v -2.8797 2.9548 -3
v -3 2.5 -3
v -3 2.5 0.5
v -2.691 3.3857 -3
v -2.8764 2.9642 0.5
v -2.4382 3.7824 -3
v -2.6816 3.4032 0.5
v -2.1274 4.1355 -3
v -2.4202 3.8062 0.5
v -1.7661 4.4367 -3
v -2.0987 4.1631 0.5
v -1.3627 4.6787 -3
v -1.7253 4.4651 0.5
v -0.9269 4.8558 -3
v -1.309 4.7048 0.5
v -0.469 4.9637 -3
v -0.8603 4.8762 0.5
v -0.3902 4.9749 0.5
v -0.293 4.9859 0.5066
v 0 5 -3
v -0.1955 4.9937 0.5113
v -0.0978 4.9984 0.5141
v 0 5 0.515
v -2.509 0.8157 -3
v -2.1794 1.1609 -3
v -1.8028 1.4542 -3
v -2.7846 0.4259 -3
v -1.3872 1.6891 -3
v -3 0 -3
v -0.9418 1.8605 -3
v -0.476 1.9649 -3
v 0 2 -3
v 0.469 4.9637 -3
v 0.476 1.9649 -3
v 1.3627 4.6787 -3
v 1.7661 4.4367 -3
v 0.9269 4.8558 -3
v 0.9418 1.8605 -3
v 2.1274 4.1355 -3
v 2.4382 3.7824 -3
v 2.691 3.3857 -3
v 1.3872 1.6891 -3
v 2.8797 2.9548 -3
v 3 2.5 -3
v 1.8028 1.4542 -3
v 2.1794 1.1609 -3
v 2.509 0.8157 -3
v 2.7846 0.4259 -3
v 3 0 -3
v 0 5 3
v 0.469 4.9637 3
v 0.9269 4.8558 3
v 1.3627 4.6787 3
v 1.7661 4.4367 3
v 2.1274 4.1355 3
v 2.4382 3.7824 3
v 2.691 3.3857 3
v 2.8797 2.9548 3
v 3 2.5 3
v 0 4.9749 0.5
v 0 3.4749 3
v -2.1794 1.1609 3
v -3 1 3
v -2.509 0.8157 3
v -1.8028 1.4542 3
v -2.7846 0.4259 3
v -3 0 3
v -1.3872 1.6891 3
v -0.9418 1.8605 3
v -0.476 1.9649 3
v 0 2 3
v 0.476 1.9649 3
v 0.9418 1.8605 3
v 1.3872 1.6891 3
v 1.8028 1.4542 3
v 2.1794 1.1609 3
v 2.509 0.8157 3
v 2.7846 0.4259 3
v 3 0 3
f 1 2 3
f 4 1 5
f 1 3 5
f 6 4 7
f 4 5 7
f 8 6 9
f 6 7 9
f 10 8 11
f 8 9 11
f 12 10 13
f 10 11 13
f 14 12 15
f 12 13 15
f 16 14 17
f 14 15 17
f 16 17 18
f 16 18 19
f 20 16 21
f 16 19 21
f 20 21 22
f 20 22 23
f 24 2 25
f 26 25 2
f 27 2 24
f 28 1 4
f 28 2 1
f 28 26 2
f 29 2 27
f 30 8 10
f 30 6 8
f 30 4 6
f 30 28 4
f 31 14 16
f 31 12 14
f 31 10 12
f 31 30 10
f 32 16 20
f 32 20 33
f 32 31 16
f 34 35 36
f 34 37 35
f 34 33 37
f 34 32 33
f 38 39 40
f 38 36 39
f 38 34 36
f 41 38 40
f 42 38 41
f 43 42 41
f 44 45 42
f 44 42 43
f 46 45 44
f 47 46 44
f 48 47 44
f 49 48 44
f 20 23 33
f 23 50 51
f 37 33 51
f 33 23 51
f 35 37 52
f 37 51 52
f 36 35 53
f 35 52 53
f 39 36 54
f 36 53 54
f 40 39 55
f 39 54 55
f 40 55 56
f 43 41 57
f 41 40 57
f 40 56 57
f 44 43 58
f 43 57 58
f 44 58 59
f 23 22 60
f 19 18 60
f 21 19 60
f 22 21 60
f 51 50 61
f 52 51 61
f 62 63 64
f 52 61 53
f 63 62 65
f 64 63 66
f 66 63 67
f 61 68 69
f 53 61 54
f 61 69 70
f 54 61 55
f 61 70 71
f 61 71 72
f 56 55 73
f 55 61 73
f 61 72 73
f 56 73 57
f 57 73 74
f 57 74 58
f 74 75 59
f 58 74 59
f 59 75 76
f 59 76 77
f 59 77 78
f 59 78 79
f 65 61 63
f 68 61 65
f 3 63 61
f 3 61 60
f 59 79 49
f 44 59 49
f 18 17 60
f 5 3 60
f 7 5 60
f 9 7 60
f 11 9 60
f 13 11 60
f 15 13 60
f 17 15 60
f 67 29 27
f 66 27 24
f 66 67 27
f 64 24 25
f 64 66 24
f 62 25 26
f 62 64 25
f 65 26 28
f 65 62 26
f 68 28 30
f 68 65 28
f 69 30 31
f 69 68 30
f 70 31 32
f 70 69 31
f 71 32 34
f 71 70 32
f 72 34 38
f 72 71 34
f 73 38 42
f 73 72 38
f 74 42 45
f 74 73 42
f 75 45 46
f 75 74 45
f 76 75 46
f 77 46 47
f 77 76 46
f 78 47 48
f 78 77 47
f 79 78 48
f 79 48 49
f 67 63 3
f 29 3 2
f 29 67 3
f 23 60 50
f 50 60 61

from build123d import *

# Parameters (mm, degrees)
SKETCH1_W           = 6
SKETCH1_H           = 6
BOSS_EXTRUDE1_DEPTH = 5
CUT_EXTRUDE4_DEPTH  = 12.5
CUT_EXTRUDE5_DEPTH  = 10
CUT_EXTRUDE6_DEPTH  = 10


with BuildPart() as part:
    # Sketch1 → Boss-Extrude1 (new body)
    with BuildSketch(Plane(origin=(0, 0, 0), x_dir=(1, 0, 0), z_dir=(0, 1, 0))):
        Rectangle(SKETCH1_W, SKETCH1_H)
    extrude(amount=BOSS_EXTRUDE1_DEPTH)

    # Sketch5 → Cut-Extrude4 (cut)
    with BuildSketch(Plane.XY.offset(3)):
        with BuildLine():
            Line((-3, 5), (-3, 2.5))
            ThreePointArc((-3, 2.5), (-1.952562419, 4.293074903), (0, 5))
            Line((0, 5), (-3, 5))
        make_face()
        with BuildLine():
            ThreePointArc((0, 5), (1.952562419, 4.293074903), (3, 2.5))
            Line((3, 2.5), (3, 5))
            Line((3, 5), (0, 5))
        make_face()
        with BuildLine():
            ThreePointArc((-3, 0), (0, 2), (3, 0))
            Line((3, 0), (-3, 0))
        make_face()
    extrude(amount=-CUT_EXTRUDE4_DEPTH, mode=Mode.SUBTRACT)

    # 3DSketch1 → Cut-Extrude5 (cut, along a direction that is not the sketch's normal)
    with BuildSketch(Plane(origin=(-3, 1, 3), x_dir=(0.5383808129093879, 0.7133433044036882, -0.4486506774244899), z_dir=(0.5775173034874745, -0.700038740615242, -0.4200232443691449))):
        Polygon((0, 0), (2.19164165, -1.922682209), (5.572263959, 0), (3.380622309, 1.922682209), align=None)
    extrude(amount=-CUT_EXTRUDE5_DEPTH, dir=(1, 0, 0), mode=Mode.SUBTRACT)

    # Sketch7 → Cut-Extrude6 (cut)
    with BuildSketch(Plane(origin=(0, 3.878630283, 2.32717817), x_dir=(1, 0, 0), z_dir=(0, -0.8574929257125444, -0.5144957554275263))):
        with BuildLine():
            Line((-0.390198698, -2.130837603), (0, -2.130837603))
            Line((0, -2.130837603), (0, 0.784638345))
            Line((0, 0.784638345), (-2.641413746, 0.784638345))
            add(Edge.make_bspline(
                [(-2.641413746, 0.784638345), (-1.886895872, -1.755586828), (-0.390198698, -2.130837603)],
                knots=[2.094371322, 2.094371322, 2.094371322, 3.013307074, 3.013307074, 3.013307074], degree=2, weights=[1, 0.896288606, 1]))
        make_face()
    extrude(amount=-CUT_EXTRUDE6_DEPTH, mode=Mode.SUBTRACT)


solid = part.part
